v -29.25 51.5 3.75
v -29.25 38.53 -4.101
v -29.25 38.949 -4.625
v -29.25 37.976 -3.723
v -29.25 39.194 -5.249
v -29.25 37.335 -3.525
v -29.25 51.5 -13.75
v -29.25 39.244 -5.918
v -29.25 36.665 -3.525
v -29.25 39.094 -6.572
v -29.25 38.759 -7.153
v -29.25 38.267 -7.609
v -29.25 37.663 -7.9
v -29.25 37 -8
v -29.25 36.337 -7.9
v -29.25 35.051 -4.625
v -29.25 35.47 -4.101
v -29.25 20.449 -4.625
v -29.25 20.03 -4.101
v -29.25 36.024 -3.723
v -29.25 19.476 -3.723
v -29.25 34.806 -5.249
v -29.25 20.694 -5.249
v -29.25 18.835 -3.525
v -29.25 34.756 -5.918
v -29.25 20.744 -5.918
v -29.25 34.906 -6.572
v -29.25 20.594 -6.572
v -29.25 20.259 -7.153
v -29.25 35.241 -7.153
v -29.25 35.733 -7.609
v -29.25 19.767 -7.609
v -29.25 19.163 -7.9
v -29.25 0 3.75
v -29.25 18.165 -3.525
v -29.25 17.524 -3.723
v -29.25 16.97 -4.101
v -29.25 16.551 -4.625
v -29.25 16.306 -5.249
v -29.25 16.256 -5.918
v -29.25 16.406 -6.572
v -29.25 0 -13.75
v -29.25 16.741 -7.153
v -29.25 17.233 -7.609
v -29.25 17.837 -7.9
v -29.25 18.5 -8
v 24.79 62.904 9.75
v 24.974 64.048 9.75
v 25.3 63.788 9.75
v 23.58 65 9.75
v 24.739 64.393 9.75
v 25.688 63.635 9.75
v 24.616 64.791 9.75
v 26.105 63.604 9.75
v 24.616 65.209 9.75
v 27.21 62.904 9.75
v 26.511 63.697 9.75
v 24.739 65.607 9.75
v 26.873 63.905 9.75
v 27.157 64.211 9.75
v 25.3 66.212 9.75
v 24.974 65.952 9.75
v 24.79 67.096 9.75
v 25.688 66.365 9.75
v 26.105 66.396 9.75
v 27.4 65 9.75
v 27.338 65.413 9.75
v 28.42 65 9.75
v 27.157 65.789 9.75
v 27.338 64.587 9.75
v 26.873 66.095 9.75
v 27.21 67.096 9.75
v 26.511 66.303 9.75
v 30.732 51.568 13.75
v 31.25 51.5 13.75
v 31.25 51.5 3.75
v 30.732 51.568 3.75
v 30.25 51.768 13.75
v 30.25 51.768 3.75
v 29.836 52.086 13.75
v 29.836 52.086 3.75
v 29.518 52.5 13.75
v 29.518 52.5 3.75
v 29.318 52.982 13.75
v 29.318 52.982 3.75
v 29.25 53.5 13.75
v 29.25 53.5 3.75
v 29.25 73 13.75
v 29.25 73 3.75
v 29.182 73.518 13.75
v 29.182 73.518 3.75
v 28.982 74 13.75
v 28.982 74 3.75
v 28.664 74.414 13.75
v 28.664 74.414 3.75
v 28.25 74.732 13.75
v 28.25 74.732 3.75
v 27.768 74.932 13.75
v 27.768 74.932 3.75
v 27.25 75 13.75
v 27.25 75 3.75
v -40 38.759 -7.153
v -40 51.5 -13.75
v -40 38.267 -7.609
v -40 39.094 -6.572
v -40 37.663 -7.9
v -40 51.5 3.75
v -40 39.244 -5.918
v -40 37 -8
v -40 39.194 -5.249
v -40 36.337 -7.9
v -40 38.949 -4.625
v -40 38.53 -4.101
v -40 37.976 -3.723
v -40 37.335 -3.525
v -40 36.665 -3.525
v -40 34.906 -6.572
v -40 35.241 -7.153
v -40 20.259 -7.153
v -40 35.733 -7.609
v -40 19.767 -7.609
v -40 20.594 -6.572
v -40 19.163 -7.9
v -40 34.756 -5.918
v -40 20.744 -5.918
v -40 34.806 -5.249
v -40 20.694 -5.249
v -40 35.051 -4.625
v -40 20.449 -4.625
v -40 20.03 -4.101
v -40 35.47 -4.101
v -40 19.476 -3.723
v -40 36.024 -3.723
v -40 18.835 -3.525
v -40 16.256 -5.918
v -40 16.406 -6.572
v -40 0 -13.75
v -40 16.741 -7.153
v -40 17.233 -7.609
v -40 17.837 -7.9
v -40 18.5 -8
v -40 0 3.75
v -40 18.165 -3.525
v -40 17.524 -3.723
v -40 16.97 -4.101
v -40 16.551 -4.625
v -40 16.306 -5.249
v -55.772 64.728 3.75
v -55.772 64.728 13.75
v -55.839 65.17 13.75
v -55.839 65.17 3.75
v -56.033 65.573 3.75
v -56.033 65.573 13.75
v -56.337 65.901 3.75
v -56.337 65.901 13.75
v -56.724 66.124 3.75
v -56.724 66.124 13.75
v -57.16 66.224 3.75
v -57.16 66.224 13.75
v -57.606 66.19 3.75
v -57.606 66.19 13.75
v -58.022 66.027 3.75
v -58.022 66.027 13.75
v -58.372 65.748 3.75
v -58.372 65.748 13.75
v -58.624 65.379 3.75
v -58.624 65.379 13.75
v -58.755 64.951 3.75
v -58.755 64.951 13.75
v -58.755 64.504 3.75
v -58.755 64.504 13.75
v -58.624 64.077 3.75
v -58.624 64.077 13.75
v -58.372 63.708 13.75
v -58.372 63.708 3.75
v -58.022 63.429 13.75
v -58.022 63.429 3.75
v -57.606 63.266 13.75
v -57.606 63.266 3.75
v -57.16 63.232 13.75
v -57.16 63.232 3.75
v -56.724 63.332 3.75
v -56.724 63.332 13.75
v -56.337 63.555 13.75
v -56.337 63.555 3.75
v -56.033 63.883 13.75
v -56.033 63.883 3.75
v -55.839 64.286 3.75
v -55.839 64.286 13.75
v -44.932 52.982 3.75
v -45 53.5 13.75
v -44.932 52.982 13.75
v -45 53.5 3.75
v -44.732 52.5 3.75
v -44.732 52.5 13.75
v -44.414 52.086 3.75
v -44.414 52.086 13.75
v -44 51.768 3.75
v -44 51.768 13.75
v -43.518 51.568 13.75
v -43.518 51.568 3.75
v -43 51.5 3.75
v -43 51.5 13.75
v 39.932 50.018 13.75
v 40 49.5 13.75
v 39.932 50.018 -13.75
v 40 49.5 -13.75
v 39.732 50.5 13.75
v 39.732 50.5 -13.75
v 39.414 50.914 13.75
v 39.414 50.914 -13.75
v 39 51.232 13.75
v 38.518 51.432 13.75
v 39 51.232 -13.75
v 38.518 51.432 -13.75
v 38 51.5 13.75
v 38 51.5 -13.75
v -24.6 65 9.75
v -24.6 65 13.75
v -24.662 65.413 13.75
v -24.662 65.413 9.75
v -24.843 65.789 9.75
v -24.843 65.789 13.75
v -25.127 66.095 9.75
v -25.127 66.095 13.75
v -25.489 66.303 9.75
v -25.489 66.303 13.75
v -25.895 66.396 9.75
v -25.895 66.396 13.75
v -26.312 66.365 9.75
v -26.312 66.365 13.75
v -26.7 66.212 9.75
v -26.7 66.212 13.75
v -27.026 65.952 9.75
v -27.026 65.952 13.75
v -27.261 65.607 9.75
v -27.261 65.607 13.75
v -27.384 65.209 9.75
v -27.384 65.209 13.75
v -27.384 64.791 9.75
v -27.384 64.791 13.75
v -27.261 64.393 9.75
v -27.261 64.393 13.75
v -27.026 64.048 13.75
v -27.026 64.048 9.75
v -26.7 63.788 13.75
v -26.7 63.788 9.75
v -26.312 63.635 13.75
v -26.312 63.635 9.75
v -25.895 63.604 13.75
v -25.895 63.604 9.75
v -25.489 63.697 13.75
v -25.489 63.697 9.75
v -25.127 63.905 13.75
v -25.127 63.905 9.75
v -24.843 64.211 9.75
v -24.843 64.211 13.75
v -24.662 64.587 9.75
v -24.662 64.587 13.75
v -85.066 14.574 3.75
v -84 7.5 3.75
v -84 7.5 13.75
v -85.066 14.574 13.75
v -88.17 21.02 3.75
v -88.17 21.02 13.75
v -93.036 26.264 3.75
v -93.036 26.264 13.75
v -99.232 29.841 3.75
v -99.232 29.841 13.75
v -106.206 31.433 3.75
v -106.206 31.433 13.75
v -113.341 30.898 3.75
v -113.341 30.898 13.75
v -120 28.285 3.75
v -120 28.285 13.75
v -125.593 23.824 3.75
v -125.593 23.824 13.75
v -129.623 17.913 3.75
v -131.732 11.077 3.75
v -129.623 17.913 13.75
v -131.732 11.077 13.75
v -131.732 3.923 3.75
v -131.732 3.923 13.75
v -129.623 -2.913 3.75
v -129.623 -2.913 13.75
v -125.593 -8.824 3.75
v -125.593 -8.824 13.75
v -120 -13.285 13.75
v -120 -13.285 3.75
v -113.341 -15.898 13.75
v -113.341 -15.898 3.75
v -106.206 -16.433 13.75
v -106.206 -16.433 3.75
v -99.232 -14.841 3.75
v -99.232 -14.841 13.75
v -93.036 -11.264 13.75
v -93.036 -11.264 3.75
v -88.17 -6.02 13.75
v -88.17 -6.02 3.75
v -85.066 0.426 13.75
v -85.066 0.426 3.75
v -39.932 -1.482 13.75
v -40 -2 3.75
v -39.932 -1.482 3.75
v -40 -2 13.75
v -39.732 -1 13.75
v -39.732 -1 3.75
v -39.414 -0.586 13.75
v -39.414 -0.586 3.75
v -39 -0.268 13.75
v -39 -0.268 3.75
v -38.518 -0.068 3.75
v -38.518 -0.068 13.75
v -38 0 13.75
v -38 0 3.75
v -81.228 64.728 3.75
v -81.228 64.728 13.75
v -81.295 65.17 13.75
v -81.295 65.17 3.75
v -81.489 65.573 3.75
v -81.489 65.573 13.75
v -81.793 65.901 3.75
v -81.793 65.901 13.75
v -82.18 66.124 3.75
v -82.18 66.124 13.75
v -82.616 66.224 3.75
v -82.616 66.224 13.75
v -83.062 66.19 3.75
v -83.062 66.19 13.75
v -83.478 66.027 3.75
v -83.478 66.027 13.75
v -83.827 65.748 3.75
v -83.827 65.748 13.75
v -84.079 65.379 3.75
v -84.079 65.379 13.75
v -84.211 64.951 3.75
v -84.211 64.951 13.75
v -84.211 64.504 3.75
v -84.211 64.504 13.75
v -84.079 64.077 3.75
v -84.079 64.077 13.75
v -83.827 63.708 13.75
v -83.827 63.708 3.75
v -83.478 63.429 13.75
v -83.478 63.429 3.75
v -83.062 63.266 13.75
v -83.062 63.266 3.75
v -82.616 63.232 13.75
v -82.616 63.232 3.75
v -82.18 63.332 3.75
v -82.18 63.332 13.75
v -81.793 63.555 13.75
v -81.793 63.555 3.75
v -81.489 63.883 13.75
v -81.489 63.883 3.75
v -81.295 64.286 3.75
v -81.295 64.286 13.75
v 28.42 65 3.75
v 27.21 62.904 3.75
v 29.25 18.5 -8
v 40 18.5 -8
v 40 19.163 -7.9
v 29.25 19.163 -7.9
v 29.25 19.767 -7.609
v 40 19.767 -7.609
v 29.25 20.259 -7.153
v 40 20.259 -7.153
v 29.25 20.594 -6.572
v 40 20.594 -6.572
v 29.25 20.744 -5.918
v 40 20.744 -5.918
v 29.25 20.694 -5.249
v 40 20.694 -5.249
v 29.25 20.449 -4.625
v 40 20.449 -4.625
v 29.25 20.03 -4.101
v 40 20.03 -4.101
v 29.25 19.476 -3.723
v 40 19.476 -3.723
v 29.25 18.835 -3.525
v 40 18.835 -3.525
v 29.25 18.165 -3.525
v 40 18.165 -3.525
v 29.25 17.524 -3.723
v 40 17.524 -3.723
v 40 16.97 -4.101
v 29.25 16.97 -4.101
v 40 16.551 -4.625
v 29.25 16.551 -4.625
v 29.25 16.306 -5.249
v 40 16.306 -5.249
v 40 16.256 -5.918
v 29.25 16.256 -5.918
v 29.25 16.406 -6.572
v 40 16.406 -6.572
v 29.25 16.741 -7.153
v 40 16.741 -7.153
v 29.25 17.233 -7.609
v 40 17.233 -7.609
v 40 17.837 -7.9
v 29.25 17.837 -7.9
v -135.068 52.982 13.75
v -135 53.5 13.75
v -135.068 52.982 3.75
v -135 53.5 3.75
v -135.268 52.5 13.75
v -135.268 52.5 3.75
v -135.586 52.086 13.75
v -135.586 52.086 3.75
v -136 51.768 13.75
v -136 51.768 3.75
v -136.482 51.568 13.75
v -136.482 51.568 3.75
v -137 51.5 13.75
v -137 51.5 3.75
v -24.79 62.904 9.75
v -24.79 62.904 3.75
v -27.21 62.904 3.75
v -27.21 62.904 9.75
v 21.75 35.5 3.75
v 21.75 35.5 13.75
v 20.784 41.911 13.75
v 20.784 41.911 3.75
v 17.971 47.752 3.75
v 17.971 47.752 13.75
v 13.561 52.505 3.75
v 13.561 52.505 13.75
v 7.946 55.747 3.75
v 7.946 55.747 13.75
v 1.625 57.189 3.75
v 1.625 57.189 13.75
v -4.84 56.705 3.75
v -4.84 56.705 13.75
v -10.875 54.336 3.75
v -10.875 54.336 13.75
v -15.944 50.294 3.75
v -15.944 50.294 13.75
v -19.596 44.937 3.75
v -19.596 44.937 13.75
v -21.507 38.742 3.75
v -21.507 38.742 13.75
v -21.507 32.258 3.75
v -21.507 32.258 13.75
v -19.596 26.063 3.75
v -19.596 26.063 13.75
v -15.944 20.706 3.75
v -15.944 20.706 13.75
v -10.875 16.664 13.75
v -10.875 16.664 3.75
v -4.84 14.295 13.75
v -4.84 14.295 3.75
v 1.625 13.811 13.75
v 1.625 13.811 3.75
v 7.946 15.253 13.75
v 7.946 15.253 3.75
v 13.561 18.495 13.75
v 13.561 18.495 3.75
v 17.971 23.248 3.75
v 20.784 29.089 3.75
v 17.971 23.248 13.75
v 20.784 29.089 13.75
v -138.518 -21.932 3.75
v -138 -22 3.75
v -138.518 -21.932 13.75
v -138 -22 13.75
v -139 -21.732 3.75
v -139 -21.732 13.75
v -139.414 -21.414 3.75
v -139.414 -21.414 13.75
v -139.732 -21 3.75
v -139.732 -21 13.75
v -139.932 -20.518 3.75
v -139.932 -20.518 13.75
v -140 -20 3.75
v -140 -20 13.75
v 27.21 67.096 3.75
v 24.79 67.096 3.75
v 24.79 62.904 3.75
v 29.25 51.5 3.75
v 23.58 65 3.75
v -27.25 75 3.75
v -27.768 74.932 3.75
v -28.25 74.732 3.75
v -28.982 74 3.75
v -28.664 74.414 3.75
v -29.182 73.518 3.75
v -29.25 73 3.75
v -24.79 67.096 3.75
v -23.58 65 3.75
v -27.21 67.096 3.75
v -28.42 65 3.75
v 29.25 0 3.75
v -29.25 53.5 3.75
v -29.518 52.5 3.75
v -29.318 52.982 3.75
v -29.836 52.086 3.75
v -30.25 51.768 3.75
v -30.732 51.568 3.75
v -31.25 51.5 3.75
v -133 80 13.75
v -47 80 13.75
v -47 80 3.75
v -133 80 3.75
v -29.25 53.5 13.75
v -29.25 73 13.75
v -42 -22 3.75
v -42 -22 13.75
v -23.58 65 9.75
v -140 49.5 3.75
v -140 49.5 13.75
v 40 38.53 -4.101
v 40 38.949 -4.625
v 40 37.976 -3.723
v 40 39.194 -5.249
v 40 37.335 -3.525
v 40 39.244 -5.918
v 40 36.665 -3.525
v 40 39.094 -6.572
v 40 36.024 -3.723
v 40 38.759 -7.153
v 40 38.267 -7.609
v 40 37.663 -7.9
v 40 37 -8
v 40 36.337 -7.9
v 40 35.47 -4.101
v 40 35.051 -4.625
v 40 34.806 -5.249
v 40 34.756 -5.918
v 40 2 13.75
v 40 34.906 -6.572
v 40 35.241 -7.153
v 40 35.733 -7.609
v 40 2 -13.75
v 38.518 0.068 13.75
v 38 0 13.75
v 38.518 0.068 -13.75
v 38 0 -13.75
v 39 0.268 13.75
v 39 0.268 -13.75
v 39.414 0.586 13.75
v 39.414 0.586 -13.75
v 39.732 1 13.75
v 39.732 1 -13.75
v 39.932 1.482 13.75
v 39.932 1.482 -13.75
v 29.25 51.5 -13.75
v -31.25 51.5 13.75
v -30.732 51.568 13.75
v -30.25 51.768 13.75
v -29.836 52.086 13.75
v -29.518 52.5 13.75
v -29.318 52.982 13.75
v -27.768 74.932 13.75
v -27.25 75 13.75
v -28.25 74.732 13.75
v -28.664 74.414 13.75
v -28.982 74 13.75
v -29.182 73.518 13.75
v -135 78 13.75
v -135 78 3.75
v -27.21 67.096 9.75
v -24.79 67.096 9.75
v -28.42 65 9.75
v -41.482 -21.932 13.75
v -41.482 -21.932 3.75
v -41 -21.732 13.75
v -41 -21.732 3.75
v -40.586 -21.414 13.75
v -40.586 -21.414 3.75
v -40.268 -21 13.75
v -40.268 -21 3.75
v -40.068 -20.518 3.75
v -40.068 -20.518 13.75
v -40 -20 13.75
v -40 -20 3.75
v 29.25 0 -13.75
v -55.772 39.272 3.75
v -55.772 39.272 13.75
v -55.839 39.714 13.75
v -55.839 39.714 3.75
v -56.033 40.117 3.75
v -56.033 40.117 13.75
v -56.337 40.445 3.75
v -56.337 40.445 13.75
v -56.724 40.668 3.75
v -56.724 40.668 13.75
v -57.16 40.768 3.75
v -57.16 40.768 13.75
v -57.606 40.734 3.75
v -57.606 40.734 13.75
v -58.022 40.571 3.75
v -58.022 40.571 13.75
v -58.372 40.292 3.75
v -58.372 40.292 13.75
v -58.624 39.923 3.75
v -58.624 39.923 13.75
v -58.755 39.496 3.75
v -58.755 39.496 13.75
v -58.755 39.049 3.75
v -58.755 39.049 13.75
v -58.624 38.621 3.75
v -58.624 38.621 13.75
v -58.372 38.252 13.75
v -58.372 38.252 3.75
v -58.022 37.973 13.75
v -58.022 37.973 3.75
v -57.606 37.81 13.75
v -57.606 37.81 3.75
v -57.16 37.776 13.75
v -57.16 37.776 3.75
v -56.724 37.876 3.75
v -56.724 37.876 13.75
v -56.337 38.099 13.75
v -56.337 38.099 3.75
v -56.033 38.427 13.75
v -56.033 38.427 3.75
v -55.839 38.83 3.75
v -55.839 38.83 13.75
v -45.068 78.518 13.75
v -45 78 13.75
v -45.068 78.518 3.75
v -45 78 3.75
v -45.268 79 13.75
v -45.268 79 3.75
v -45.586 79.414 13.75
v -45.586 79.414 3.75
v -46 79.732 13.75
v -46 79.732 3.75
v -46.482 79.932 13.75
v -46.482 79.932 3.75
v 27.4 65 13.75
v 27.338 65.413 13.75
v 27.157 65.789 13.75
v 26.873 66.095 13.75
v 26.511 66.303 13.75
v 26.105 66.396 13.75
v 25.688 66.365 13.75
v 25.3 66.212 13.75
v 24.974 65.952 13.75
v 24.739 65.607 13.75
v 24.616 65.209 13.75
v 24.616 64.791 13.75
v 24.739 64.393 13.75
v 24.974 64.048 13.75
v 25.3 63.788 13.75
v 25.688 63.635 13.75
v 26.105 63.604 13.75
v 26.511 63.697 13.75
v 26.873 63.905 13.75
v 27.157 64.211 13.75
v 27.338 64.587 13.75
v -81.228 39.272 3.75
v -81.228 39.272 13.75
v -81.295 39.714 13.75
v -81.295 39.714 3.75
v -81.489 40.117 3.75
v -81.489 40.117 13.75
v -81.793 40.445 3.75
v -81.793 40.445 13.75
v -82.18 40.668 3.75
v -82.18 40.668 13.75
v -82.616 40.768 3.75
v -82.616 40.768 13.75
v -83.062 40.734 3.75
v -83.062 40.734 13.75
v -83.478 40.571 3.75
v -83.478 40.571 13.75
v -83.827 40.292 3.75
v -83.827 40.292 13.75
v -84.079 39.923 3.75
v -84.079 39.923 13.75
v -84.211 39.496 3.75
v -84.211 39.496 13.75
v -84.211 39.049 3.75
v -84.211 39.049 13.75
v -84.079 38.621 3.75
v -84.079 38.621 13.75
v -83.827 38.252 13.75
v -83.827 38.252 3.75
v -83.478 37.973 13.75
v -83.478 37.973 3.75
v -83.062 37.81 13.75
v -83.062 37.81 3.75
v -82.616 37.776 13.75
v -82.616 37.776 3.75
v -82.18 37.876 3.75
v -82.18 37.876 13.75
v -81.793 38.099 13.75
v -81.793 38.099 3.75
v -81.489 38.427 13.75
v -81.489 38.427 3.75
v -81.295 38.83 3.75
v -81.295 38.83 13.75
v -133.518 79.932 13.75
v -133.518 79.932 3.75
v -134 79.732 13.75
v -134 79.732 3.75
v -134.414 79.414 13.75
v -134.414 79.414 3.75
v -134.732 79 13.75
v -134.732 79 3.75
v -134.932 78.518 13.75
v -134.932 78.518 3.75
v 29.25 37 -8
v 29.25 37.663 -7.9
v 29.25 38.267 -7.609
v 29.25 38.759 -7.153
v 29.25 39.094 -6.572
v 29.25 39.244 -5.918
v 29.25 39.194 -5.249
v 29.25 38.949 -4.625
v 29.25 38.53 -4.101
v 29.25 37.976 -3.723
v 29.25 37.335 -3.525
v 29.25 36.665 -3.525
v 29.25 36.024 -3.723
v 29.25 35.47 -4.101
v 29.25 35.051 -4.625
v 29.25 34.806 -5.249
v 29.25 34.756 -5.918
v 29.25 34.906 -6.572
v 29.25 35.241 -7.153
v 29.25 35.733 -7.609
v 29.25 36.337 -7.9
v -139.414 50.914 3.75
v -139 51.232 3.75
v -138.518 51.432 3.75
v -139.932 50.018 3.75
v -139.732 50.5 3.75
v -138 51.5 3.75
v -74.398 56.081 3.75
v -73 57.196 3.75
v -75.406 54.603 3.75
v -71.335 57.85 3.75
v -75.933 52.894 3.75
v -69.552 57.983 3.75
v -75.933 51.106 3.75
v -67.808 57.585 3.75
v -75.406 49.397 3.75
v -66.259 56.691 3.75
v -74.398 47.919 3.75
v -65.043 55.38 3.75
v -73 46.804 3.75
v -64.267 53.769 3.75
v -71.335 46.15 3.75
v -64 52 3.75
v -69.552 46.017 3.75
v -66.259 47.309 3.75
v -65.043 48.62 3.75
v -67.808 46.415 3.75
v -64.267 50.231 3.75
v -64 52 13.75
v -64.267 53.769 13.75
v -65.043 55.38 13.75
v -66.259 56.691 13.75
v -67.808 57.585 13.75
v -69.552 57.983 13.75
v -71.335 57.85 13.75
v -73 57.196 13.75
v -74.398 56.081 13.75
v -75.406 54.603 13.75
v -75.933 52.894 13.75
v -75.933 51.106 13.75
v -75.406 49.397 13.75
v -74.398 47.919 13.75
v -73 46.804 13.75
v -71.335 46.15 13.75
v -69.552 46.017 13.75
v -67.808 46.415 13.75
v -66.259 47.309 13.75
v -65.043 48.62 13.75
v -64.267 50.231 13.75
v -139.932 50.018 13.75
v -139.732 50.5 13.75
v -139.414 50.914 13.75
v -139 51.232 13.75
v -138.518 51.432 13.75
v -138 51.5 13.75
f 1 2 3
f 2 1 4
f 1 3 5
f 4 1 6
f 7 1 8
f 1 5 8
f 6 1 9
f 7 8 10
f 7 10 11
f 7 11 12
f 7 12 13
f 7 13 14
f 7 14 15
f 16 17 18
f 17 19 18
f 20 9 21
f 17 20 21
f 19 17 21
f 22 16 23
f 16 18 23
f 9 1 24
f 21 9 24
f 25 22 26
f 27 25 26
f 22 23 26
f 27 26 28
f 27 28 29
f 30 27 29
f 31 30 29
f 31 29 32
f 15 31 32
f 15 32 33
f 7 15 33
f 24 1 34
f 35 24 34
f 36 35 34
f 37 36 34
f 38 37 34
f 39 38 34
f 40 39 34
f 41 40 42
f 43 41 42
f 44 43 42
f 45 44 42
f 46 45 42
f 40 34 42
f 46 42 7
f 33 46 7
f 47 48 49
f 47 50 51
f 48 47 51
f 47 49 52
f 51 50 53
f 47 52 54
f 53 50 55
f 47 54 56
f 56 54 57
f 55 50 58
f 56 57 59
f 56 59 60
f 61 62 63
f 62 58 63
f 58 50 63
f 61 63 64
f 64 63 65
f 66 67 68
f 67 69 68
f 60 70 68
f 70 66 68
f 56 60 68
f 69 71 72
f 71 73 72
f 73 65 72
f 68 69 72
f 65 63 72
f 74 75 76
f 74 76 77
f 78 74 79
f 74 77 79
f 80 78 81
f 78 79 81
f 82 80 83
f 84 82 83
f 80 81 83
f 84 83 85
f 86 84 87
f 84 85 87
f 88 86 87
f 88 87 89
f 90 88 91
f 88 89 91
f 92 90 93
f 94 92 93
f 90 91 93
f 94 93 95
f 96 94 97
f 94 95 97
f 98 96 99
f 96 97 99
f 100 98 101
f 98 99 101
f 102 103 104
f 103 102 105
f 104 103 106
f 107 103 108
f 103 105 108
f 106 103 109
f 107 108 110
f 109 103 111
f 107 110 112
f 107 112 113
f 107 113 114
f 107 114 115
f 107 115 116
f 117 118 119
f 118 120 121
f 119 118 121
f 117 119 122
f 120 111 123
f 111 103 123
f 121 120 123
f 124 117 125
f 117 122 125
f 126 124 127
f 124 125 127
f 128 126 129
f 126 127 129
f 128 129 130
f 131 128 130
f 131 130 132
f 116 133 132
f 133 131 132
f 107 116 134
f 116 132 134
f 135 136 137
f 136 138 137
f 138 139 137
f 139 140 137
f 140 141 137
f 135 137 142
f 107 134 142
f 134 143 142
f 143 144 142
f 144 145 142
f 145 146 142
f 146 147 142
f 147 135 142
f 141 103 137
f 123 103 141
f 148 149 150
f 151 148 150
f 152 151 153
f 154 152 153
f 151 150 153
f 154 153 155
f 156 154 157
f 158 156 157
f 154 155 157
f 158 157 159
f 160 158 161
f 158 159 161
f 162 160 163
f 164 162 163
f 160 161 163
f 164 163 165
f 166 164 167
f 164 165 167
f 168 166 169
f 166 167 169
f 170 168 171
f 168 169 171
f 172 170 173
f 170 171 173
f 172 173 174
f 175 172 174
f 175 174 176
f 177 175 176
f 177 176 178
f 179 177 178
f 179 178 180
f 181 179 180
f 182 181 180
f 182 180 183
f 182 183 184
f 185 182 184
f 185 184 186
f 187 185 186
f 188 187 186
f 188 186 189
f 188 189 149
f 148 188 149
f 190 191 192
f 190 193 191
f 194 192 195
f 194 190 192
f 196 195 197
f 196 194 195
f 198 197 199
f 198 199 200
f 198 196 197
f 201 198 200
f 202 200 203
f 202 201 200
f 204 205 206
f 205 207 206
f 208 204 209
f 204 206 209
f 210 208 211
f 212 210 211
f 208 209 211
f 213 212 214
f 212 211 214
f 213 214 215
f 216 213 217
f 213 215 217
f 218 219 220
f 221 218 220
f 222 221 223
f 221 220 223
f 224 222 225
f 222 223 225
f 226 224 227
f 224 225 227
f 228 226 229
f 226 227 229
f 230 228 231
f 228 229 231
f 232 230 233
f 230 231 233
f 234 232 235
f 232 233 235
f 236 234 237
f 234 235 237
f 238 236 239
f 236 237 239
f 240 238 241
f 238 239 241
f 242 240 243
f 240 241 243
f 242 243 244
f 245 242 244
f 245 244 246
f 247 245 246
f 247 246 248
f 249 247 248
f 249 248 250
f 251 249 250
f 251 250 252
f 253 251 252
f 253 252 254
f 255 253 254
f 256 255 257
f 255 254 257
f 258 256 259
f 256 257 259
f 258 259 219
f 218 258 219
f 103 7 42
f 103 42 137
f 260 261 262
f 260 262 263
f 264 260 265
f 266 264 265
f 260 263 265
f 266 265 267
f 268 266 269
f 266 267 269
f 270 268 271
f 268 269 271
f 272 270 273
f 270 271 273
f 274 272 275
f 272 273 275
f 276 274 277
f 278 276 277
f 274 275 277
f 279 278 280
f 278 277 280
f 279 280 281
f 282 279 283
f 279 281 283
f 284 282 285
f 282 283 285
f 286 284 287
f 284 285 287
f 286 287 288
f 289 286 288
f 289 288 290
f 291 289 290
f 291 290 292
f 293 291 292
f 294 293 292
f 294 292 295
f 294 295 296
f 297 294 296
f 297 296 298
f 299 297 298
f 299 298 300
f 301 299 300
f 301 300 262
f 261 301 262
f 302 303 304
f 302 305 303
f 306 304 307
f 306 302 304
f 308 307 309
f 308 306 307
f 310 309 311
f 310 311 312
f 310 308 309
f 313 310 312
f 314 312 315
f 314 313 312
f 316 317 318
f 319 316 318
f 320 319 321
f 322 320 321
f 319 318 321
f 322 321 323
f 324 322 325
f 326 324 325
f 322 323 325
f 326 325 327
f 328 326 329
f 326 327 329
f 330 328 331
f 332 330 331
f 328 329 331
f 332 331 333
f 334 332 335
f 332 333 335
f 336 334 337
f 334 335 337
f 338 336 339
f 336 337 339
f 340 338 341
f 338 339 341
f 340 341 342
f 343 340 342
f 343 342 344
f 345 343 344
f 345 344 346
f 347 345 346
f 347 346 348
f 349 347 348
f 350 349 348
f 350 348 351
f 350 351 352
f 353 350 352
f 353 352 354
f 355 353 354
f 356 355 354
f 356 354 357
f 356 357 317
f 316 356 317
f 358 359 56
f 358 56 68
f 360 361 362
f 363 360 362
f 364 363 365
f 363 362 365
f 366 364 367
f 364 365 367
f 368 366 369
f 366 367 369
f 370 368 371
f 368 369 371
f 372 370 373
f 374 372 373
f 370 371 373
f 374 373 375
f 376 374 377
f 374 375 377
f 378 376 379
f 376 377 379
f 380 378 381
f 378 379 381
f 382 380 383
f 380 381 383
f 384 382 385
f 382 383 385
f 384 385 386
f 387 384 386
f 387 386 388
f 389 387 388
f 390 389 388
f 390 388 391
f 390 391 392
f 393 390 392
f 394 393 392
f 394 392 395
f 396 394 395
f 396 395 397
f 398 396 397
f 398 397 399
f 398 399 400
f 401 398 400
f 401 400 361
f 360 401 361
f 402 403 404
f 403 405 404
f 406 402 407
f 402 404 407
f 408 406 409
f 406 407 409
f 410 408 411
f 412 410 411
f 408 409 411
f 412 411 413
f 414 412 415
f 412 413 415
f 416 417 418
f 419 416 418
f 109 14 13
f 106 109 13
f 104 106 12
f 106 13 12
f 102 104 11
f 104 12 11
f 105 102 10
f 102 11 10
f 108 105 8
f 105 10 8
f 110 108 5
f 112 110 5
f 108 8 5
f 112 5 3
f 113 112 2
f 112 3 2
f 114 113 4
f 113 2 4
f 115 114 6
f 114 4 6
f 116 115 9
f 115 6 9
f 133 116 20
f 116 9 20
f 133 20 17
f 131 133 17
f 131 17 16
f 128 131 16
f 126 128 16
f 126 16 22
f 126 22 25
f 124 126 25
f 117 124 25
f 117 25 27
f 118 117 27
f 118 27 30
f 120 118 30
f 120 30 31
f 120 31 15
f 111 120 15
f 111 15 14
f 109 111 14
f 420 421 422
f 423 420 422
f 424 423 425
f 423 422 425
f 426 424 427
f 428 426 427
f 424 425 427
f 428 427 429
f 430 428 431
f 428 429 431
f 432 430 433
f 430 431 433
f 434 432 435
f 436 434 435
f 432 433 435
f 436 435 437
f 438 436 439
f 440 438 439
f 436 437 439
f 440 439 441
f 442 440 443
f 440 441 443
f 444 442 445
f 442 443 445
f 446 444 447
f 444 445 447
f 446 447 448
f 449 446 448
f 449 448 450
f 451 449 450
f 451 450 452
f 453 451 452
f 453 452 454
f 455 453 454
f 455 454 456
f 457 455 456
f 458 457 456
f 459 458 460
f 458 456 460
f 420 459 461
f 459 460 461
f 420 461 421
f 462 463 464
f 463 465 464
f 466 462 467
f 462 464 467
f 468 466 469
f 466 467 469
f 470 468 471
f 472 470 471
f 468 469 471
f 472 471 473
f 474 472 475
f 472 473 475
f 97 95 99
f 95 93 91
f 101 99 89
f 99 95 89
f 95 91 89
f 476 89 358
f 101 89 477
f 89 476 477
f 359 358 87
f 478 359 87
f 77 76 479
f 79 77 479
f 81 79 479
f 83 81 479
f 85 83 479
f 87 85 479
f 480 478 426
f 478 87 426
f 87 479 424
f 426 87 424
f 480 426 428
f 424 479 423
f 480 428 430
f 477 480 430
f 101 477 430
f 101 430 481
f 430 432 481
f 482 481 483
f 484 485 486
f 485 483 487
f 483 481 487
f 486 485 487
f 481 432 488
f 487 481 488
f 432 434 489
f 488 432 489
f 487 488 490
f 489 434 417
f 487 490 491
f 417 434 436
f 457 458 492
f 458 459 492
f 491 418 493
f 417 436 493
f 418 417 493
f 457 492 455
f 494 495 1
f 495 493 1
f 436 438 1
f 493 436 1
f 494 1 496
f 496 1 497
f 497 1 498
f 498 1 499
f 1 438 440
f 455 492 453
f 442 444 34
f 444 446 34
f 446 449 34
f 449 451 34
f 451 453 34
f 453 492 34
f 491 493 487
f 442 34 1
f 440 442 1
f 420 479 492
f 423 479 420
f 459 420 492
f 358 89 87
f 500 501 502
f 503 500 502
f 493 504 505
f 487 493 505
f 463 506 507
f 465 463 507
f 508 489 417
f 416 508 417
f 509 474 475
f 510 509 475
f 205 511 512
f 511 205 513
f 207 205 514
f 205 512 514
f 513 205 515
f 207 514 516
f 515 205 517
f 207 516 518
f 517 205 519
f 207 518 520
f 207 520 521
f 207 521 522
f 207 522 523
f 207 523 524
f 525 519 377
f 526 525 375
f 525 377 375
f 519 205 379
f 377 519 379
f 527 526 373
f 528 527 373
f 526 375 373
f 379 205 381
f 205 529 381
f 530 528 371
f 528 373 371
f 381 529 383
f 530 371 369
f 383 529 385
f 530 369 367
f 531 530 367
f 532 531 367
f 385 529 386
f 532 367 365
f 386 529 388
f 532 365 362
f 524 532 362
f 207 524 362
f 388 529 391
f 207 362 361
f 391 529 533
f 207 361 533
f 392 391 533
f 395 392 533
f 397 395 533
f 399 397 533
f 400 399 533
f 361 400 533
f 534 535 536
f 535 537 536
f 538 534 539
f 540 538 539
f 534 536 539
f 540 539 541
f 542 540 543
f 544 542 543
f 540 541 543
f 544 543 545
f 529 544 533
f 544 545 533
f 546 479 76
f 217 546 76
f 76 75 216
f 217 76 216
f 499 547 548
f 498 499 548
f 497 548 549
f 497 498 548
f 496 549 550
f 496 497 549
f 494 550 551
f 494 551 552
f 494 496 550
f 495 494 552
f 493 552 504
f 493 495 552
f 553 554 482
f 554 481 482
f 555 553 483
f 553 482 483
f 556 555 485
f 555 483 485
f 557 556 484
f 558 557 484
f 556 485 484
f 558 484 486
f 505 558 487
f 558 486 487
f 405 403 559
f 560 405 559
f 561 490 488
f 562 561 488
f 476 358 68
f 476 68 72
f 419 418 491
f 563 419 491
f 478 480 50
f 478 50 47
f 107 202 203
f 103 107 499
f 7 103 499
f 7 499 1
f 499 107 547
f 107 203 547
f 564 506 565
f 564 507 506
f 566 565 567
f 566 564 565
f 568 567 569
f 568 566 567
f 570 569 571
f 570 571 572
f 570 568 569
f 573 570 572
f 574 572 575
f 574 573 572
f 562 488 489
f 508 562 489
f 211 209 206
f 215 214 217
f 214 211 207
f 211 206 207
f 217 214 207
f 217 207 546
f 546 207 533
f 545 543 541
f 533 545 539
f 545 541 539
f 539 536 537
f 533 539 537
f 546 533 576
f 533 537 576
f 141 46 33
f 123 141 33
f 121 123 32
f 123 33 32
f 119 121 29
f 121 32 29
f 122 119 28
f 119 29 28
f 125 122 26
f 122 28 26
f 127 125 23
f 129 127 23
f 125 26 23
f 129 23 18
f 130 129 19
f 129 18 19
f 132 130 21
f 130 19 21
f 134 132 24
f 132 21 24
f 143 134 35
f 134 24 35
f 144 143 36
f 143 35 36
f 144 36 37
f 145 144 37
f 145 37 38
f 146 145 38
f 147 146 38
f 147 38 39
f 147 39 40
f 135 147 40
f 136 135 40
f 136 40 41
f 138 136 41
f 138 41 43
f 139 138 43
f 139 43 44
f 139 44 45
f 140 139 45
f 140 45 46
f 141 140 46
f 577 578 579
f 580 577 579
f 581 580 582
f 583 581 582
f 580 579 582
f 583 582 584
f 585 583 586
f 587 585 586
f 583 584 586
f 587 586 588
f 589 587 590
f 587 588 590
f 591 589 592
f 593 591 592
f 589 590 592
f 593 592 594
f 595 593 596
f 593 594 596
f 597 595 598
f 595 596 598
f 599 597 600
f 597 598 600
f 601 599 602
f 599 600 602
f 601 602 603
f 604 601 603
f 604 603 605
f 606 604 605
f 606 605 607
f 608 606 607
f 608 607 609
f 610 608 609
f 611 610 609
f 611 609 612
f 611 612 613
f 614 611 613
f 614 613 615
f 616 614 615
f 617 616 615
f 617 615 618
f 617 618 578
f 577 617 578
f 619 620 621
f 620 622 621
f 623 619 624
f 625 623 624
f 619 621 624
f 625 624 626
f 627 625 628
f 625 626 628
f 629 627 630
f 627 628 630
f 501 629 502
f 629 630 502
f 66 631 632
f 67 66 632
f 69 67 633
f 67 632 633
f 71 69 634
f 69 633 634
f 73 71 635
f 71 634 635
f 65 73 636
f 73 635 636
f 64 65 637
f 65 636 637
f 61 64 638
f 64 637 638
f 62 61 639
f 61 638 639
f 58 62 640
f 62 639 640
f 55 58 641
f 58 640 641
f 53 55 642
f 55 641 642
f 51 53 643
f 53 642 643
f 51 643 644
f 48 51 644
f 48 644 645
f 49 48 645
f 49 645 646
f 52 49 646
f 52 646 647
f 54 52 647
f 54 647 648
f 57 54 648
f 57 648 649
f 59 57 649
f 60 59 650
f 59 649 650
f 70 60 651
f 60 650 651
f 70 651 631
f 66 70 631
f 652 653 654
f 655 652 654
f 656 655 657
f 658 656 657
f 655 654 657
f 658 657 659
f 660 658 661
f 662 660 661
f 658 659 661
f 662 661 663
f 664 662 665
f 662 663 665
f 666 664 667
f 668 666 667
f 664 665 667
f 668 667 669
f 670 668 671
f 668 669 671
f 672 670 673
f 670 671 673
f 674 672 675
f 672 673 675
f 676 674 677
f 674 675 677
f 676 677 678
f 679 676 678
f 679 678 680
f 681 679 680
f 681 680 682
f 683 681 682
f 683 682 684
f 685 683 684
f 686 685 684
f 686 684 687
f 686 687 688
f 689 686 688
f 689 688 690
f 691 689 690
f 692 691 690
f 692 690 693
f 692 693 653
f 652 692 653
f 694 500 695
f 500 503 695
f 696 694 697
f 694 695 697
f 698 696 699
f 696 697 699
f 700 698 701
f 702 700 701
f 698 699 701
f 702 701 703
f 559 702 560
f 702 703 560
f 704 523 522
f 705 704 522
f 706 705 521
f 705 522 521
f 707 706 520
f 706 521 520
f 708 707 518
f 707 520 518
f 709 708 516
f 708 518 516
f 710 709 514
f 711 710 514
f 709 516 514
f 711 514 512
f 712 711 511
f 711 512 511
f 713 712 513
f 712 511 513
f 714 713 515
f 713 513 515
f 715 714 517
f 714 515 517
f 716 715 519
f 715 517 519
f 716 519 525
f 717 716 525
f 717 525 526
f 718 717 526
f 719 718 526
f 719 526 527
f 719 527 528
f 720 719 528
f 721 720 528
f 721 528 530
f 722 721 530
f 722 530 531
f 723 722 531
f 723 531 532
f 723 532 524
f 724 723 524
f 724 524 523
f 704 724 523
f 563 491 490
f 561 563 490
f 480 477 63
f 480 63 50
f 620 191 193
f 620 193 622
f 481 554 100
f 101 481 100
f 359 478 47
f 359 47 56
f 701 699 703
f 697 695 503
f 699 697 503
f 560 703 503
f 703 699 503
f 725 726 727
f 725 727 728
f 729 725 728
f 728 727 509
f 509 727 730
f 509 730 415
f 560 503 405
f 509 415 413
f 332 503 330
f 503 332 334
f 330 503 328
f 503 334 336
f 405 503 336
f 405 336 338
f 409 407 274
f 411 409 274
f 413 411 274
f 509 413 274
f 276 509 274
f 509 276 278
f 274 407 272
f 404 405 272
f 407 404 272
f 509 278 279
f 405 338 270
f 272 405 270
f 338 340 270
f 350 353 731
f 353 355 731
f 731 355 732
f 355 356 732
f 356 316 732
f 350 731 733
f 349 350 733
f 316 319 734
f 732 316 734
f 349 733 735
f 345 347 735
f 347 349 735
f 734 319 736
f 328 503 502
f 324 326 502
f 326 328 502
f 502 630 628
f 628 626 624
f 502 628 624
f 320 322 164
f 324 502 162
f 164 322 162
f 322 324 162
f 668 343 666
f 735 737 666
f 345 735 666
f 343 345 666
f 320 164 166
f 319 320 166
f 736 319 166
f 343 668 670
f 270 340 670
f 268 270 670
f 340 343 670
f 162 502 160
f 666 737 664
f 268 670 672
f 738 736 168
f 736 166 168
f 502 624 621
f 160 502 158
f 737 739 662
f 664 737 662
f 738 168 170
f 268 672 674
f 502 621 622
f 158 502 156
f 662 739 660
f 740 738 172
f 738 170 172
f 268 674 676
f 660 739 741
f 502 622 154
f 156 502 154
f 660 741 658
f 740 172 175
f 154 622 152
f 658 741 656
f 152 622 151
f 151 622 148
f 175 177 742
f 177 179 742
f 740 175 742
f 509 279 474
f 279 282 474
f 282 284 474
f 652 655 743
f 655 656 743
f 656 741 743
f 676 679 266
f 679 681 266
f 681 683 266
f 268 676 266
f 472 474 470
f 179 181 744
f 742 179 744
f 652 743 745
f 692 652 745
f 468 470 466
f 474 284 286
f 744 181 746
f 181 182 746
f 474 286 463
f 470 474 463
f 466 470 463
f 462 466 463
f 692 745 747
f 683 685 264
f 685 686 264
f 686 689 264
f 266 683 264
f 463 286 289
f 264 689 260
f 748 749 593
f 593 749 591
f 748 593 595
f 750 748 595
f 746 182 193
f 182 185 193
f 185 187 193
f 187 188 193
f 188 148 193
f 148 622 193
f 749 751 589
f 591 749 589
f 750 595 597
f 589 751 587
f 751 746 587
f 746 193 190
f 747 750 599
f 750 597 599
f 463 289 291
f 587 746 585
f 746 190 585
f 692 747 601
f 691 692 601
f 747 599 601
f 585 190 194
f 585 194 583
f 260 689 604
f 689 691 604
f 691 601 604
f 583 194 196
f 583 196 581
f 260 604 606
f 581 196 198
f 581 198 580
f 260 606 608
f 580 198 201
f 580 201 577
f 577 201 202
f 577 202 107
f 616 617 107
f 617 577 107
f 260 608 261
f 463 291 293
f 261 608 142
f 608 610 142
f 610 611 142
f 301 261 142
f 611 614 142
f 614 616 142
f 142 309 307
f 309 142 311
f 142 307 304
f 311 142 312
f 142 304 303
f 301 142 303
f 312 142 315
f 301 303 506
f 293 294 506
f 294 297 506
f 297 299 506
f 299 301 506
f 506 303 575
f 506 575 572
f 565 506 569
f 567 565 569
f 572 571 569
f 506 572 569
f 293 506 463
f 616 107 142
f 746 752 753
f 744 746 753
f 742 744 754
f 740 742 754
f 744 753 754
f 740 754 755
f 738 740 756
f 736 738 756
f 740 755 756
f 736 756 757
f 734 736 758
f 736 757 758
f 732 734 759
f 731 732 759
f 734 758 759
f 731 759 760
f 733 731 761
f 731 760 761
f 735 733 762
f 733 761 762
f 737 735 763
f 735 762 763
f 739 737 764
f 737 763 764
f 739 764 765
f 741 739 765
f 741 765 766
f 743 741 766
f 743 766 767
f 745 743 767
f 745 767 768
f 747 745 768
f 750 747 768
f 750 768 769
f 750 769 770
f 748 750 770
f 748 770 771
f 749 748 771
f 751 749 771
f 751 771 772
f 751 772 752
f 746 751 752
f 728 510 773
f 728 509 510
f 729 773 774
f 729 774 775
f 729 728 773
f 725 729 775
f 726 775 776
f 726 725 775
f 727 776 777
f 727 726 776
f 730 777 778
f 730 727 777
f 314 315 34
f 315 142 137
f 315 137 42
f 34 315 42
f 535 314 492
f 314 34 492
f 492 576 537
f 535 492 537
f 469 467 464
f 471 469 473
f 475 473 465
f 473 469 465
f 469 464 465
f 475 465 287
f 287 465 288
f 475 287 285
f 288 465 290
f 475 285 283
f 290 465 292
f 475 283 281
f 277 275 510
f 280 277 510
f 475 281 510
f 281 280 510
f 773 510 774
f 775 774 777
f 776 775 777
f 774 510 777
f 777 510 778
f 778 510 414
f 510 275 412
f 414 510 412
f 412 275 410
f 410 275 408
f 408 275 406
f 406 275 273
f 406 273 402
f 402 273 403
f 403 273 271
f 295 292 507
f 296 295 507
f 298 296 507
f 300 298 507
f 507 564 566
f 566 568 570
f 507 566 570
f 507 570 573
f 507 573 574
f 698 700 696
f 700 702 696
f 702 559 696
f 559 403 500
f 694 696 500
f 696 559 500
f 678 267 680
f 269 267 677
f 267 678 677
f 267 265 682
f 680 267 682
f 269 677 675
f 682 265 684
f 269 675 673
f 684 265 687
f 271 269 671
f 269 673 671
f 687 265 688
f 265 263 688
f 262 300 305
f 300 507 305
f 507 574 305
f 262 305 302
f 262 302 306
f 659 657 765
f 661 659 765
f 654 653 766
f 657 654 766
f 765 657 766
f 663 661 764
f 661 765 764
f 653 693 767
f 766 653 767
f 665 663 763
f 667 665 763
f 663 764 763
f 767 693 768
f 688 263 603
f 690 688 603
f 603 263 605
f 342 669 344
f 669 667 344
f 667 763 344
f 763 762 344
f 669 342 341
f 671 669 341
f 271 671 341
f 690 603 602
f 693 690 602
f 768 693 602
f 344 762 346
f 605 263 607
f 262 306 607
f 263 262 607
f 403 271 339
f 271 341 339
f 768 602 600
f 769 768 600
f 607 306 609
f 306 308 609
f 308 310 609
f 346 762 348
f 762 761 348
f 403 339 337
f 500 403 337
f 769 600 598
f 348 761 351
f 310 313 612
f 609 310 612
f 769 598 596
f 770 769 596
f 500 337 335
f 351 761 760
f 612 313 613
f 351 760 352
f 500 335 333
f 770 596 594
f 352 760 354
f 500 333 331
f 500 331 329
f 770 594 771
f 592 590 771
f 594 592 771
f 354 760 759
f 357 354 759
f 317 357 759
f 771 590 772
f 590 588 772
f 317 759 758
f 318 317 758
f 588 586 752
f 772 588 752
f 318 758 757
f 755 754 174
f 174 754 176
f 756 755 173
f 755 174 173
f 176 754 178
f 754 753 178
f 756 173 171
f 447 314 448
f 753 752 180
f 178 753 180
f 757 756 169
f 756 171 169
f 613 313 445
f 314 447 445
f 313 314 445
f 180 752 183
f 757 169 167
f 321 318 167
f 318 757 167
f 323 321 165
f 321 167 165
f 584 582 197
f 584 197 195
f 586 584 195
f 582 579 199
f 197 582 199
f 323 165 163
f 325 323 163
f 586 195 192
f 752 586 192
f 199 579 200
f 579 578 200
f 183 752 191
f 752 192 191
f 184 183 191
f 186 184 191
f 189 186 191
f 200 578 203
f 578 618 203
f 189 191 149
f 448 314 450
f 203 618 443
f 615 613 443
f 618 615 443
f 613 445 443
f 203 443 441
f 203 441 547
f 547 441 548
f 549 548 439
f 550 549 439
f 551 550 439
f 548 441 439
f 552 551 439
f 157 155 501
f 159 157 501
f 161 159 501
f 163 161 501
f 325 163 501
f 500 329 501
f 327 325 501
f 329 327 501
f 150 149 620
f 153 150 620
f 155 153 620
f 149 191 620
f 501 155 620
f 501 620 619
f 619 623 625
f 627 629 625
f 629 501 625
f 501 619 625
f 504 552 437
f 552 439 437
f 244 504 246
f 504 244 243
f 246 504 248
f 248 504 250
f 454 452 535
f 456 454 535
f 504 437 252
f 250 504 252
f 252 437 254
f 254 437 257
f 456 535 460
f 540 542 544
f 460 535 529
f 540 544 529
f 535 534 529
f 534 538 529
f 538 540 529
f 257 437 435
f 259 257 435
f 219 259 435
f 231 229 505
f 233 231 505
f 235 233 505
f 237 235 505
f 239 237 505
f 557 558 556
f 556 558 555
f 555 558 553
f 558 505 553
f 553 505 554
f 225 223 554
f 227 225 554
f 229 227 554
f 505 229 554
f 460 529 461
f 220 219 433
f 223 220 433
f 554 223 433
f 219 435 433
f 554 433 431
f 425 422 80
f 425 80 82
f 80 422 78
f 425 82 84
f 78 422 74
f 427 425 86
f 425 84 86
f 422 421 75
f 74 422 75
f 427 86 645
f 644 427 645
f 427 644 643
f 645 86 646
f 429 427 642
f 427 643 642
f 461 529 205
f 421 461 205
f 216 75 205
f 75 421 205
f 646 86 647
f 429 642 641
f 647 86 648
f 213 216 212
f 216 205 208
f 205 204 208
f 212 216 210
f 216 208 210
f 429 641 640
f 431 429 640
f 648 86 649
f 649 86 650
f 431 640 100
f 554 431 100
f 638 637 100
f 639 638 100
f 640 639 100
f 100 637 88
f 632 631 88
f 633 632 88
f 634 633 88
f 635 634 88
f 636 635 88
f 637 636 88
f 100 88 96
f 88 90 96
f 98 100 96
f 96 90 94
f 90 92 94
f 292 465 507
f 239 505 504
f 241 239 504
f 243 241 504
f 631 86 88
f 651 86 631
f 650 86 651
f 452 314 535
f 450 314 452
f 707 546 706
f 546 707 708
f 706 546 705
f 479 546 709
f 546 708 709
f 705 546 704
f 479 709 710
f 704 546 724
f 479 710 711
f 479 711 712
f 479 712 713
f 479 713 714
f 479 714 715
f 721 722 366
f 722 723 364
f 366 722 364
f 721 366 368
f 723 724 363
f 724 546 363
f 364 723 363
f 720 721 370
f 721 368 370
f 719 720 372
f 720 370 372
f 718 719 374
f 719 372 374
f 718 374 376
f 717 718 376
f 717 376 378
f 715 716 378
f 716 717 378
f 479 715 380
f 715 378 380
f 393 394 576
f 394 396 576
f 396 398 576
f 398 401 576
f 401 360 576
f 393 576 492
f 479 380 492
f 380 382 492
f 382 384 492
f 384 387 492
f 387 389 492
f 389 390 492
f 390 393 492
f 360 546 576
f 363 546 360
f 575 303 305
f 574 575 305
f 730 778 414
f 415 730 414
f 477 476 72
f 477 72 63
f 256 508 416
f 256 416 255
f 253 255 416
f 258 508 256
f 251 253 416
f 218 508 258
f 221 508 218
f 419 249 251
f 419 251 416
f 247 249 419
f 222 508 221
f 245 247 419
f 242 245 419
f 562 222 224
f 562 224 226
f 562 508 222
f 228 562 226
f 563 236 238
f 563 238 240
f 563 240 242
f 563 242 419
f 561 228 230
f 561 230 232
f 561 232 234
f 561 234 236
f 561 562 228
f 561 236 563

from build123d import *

# Parameters (mm, degrees)
BOSS_EXTRUDE1_DEPTH = 80
SKETCH2_R           = 21.75
CUT_EXTRUDE1_DEPTH  = 10
SKETCH3_R           = 1.4
CUT_EXTRUDE2_DEPTH  = 4
CUT_EXTRUDE3_DEPTH  = 6
SKETCH5_R           = 2.25
CUT_EXTRUDE4_DEPTH  = 81
SKETCH6_W           = 10.75
SKETCH6_H           = 28.5
CUT_EXTRUDE5_DEPTH  = 28.5
BOSS_EXTRUDE2_DEPTH = 100
SKETCH8_W           = 5
SKETCH8_H           = 28.5
CUT_EXTRUDE6_DEPTH  = 80
SKETCH9_R           = 24
CUT_EXTRUDE7_DEPTH  = 80
SKETCH12_R          = 6
CUT_EXTRUDE9_DEPTH  = 28
SKETCH13_W          = 58.5
SKETCH13_H          = 5
CUT_EXTRUDE10_DEPTH = 28.5
FILLET2_R           = 2
SKETCH15_R          = 1.5
CUT_EXTRUDE11_DEPTH = 28.5


with BuildPart() as part:
    # Sketch1 → Boss-Extrude1 (new body)
    with BuildSketch(Plane(origin=(0, 0, 0), x_dir=(1, 0, 0), z_dir=(0, 1, 0))):
        Polygon((-40, -13.75), (40, -13.75), (40, 13.75), (29.25, 13.75), (29.25, -3.75), (-29.25, -3.75), (-29.25, 13.75), (-40, 13.75), align=None)
    extrude(amount=BOSS_EXTRUDE1_DEPTH)

    # Sketch2 → Cut-Extrude1 (cut)
    with BuildSketch(Plane.XY.offset(13.75)):
        with Locations((0, 35.5)):
            Circle(SKETCH2_R)
    extrude(amount=-CUT_EXTRUDE1_DEPTH, mode=Mode.SUBTRACT)

    # Sketch3 → Cut-Extrude2 (cut)
    with BuildSketch(Plane.XY.offset(13.75)):
        with Locations((26, 65)):
            Circle(SKETCH3_R)
        with Locations((-26, 65)):
            Circle(SKETCH3_R)
    extrude(amount=-CUT_EXTRUDE2_DEPTH, mode=Mode.SUBTRACT)

    # Sketch4 → Cut-Extrude3 (cut)
    with BuildSketch(Plane(origin=(0, 0, 3.75), x_dir=(-1, 0, 0), z_dir=(0, 0, -1))):
        Polygon((-27.21, 62.904218523), (-28.42, 65), (-27.21, 67.095781477), (-24.79, 67.095781477), (-23.58, 65), (-24.79, 62.904218523), align=None)
        Polygon((28.42, 65), (27.21, 67.095781477), (24.79, 67.095781477), (23.58, 65), (24.79, 62.904218523), (27.21, 62.904218523), align=None)
    extrude(amount=-CUT_EXTRUDE3_DEPTH, mode=Mode.SUBTRACT)

    # Sketch5 → Cut-Extrude4 (cut, through all)
    with BuildSketch(Plane(origin=(40, 0, 0), x_dir=(0, 0, -1), z_dir=(1, 0, 0))):
        with Locations((5.75, 18.5)):
            Circle(SKETCH5_R)
        with Locations((5.75, 37)):
            Circle(SKETCH5_R)
    extrude(amount=-CUT_EXTRUDE4_DEPTH, mode=Mode.SUBTRACT)

    # Sketch6 → Cut-Extrude5 (cut, through all)
    with BuildSketch(Plane.XY.offset(13.75)):
        with Locations((-34.625, 65.75)):
            Rectangle(SKETCH6_W, SKETCH6_H)
        with Locations((34.625, 65.75)):
            Rectangle(SKETCH6_W, SKETCH6_H)
    extrude(amount=-CUT_EXTRUDE5_DEPTH, mode=Mode.SUBTRACT)

    # Sketch7 → Boss-Extrude2 (add)
    with BuildSketch(Plane.ZY.offset(40)):
        Polygon((3.75, 0), (3.75, -22), (13.75, -22), (13.75, 0), (13.75, 80), (3.75, 80), align=None)
    extrude(amount=BOSS_EXTRUDE2_DEPTH)

    # Sketch8 → Cut-Extrude6 (cut)
    with BuildSketch(Plane.XY.offset(13.75)):
        with Locations((-42.5, 65.75)):
            Rectangle(SKETCH8_W, SKETCH8_H)
        with Locations((-137.5, 65.75)):
            Rectangle(SKETCH8_W, SKETCH8_H)
    extrude(amount=-CUT_EXTRUDE6_DEPTH, mode=Mode.SUBTRACT)

    # Sketch9 → Cut-Extrude7 (cut)
    with BuildSketch(Plane.XY.offset(13.75)):
        with Locations((-108, 7.5)):
            Circle(SKETCH9_R)
    extrude(amount=-CUT_EXTRUDE7_DEPTH, mode=Mode.SUBTRACT)

    # Sketch12 → Cut-Extrude9 (cut)
    with BuildSketch(Plane.XY.offset(13.75)):
        with Locations((-70, 52)):
            Circle(SKETCH12_R)
    extrude(amount=-CUT_EXTRUDE9_DEPTH, mode=Mode.SUBTRACT)

    # Sketch13 → Cut-Extrude10 (cut, through all)
    with BuildSketch(Plane.XY.offset(13.75)):
        with Locations((0, 77.5)):
            Rectangle(SKETCH13_W, SKETCH13_H)
    extrude(amount=-CUT_EXTRUDE10_DEPTH, mode=Mode.SUBTRACT)

    # Fillet2
    fillet2_edges = [part.edges().sort_by_distance(p)[0] for p in [
        (-29.25, 51.5, 8.75),
        (29.25, 51.5, 8.75),
        (40, 51.5, 0),
        (-40, 0, 8.75),
        (-40, -22, 8.75),
        (-140, -22, 8.75),
        (-140, 51.5, 8.75),
        (-45, 51.5, 8.75),
        (-45, 80, 8.75),
        (-135, 80, 8.75),
        (-135, 51.5, 8.75),
        (-29.25, 75, 8.75),
        (29.25, 75, 8.75),
        (40, 0, 0),
    ]]
    fillet(fillet2_edges, radius=FILLET2_R)

    # Sketch15 → Cut-Extrude11 (cut, through all)
    with BuildSketch(Plane.XY.offset(13.75)):
        with Locations((-57.272077939, 64.727922061)):
            Circle(SKETCH15_R)
        with Locations((-57.272077939, 39.272077939)):
            Circle(SKETCH15_R)
        with Locations((-82.727922061, 39.272077939)):
            Circle(SKETCH15_R)
        with Locations((-82.727922061, 64.727922061)):
            Circle(SKETCH15_R)
    extrude(amount=-CUT_EXTRUDE11_DEPTH, mode=Mode.SUBTRACT)


solid = part.part
